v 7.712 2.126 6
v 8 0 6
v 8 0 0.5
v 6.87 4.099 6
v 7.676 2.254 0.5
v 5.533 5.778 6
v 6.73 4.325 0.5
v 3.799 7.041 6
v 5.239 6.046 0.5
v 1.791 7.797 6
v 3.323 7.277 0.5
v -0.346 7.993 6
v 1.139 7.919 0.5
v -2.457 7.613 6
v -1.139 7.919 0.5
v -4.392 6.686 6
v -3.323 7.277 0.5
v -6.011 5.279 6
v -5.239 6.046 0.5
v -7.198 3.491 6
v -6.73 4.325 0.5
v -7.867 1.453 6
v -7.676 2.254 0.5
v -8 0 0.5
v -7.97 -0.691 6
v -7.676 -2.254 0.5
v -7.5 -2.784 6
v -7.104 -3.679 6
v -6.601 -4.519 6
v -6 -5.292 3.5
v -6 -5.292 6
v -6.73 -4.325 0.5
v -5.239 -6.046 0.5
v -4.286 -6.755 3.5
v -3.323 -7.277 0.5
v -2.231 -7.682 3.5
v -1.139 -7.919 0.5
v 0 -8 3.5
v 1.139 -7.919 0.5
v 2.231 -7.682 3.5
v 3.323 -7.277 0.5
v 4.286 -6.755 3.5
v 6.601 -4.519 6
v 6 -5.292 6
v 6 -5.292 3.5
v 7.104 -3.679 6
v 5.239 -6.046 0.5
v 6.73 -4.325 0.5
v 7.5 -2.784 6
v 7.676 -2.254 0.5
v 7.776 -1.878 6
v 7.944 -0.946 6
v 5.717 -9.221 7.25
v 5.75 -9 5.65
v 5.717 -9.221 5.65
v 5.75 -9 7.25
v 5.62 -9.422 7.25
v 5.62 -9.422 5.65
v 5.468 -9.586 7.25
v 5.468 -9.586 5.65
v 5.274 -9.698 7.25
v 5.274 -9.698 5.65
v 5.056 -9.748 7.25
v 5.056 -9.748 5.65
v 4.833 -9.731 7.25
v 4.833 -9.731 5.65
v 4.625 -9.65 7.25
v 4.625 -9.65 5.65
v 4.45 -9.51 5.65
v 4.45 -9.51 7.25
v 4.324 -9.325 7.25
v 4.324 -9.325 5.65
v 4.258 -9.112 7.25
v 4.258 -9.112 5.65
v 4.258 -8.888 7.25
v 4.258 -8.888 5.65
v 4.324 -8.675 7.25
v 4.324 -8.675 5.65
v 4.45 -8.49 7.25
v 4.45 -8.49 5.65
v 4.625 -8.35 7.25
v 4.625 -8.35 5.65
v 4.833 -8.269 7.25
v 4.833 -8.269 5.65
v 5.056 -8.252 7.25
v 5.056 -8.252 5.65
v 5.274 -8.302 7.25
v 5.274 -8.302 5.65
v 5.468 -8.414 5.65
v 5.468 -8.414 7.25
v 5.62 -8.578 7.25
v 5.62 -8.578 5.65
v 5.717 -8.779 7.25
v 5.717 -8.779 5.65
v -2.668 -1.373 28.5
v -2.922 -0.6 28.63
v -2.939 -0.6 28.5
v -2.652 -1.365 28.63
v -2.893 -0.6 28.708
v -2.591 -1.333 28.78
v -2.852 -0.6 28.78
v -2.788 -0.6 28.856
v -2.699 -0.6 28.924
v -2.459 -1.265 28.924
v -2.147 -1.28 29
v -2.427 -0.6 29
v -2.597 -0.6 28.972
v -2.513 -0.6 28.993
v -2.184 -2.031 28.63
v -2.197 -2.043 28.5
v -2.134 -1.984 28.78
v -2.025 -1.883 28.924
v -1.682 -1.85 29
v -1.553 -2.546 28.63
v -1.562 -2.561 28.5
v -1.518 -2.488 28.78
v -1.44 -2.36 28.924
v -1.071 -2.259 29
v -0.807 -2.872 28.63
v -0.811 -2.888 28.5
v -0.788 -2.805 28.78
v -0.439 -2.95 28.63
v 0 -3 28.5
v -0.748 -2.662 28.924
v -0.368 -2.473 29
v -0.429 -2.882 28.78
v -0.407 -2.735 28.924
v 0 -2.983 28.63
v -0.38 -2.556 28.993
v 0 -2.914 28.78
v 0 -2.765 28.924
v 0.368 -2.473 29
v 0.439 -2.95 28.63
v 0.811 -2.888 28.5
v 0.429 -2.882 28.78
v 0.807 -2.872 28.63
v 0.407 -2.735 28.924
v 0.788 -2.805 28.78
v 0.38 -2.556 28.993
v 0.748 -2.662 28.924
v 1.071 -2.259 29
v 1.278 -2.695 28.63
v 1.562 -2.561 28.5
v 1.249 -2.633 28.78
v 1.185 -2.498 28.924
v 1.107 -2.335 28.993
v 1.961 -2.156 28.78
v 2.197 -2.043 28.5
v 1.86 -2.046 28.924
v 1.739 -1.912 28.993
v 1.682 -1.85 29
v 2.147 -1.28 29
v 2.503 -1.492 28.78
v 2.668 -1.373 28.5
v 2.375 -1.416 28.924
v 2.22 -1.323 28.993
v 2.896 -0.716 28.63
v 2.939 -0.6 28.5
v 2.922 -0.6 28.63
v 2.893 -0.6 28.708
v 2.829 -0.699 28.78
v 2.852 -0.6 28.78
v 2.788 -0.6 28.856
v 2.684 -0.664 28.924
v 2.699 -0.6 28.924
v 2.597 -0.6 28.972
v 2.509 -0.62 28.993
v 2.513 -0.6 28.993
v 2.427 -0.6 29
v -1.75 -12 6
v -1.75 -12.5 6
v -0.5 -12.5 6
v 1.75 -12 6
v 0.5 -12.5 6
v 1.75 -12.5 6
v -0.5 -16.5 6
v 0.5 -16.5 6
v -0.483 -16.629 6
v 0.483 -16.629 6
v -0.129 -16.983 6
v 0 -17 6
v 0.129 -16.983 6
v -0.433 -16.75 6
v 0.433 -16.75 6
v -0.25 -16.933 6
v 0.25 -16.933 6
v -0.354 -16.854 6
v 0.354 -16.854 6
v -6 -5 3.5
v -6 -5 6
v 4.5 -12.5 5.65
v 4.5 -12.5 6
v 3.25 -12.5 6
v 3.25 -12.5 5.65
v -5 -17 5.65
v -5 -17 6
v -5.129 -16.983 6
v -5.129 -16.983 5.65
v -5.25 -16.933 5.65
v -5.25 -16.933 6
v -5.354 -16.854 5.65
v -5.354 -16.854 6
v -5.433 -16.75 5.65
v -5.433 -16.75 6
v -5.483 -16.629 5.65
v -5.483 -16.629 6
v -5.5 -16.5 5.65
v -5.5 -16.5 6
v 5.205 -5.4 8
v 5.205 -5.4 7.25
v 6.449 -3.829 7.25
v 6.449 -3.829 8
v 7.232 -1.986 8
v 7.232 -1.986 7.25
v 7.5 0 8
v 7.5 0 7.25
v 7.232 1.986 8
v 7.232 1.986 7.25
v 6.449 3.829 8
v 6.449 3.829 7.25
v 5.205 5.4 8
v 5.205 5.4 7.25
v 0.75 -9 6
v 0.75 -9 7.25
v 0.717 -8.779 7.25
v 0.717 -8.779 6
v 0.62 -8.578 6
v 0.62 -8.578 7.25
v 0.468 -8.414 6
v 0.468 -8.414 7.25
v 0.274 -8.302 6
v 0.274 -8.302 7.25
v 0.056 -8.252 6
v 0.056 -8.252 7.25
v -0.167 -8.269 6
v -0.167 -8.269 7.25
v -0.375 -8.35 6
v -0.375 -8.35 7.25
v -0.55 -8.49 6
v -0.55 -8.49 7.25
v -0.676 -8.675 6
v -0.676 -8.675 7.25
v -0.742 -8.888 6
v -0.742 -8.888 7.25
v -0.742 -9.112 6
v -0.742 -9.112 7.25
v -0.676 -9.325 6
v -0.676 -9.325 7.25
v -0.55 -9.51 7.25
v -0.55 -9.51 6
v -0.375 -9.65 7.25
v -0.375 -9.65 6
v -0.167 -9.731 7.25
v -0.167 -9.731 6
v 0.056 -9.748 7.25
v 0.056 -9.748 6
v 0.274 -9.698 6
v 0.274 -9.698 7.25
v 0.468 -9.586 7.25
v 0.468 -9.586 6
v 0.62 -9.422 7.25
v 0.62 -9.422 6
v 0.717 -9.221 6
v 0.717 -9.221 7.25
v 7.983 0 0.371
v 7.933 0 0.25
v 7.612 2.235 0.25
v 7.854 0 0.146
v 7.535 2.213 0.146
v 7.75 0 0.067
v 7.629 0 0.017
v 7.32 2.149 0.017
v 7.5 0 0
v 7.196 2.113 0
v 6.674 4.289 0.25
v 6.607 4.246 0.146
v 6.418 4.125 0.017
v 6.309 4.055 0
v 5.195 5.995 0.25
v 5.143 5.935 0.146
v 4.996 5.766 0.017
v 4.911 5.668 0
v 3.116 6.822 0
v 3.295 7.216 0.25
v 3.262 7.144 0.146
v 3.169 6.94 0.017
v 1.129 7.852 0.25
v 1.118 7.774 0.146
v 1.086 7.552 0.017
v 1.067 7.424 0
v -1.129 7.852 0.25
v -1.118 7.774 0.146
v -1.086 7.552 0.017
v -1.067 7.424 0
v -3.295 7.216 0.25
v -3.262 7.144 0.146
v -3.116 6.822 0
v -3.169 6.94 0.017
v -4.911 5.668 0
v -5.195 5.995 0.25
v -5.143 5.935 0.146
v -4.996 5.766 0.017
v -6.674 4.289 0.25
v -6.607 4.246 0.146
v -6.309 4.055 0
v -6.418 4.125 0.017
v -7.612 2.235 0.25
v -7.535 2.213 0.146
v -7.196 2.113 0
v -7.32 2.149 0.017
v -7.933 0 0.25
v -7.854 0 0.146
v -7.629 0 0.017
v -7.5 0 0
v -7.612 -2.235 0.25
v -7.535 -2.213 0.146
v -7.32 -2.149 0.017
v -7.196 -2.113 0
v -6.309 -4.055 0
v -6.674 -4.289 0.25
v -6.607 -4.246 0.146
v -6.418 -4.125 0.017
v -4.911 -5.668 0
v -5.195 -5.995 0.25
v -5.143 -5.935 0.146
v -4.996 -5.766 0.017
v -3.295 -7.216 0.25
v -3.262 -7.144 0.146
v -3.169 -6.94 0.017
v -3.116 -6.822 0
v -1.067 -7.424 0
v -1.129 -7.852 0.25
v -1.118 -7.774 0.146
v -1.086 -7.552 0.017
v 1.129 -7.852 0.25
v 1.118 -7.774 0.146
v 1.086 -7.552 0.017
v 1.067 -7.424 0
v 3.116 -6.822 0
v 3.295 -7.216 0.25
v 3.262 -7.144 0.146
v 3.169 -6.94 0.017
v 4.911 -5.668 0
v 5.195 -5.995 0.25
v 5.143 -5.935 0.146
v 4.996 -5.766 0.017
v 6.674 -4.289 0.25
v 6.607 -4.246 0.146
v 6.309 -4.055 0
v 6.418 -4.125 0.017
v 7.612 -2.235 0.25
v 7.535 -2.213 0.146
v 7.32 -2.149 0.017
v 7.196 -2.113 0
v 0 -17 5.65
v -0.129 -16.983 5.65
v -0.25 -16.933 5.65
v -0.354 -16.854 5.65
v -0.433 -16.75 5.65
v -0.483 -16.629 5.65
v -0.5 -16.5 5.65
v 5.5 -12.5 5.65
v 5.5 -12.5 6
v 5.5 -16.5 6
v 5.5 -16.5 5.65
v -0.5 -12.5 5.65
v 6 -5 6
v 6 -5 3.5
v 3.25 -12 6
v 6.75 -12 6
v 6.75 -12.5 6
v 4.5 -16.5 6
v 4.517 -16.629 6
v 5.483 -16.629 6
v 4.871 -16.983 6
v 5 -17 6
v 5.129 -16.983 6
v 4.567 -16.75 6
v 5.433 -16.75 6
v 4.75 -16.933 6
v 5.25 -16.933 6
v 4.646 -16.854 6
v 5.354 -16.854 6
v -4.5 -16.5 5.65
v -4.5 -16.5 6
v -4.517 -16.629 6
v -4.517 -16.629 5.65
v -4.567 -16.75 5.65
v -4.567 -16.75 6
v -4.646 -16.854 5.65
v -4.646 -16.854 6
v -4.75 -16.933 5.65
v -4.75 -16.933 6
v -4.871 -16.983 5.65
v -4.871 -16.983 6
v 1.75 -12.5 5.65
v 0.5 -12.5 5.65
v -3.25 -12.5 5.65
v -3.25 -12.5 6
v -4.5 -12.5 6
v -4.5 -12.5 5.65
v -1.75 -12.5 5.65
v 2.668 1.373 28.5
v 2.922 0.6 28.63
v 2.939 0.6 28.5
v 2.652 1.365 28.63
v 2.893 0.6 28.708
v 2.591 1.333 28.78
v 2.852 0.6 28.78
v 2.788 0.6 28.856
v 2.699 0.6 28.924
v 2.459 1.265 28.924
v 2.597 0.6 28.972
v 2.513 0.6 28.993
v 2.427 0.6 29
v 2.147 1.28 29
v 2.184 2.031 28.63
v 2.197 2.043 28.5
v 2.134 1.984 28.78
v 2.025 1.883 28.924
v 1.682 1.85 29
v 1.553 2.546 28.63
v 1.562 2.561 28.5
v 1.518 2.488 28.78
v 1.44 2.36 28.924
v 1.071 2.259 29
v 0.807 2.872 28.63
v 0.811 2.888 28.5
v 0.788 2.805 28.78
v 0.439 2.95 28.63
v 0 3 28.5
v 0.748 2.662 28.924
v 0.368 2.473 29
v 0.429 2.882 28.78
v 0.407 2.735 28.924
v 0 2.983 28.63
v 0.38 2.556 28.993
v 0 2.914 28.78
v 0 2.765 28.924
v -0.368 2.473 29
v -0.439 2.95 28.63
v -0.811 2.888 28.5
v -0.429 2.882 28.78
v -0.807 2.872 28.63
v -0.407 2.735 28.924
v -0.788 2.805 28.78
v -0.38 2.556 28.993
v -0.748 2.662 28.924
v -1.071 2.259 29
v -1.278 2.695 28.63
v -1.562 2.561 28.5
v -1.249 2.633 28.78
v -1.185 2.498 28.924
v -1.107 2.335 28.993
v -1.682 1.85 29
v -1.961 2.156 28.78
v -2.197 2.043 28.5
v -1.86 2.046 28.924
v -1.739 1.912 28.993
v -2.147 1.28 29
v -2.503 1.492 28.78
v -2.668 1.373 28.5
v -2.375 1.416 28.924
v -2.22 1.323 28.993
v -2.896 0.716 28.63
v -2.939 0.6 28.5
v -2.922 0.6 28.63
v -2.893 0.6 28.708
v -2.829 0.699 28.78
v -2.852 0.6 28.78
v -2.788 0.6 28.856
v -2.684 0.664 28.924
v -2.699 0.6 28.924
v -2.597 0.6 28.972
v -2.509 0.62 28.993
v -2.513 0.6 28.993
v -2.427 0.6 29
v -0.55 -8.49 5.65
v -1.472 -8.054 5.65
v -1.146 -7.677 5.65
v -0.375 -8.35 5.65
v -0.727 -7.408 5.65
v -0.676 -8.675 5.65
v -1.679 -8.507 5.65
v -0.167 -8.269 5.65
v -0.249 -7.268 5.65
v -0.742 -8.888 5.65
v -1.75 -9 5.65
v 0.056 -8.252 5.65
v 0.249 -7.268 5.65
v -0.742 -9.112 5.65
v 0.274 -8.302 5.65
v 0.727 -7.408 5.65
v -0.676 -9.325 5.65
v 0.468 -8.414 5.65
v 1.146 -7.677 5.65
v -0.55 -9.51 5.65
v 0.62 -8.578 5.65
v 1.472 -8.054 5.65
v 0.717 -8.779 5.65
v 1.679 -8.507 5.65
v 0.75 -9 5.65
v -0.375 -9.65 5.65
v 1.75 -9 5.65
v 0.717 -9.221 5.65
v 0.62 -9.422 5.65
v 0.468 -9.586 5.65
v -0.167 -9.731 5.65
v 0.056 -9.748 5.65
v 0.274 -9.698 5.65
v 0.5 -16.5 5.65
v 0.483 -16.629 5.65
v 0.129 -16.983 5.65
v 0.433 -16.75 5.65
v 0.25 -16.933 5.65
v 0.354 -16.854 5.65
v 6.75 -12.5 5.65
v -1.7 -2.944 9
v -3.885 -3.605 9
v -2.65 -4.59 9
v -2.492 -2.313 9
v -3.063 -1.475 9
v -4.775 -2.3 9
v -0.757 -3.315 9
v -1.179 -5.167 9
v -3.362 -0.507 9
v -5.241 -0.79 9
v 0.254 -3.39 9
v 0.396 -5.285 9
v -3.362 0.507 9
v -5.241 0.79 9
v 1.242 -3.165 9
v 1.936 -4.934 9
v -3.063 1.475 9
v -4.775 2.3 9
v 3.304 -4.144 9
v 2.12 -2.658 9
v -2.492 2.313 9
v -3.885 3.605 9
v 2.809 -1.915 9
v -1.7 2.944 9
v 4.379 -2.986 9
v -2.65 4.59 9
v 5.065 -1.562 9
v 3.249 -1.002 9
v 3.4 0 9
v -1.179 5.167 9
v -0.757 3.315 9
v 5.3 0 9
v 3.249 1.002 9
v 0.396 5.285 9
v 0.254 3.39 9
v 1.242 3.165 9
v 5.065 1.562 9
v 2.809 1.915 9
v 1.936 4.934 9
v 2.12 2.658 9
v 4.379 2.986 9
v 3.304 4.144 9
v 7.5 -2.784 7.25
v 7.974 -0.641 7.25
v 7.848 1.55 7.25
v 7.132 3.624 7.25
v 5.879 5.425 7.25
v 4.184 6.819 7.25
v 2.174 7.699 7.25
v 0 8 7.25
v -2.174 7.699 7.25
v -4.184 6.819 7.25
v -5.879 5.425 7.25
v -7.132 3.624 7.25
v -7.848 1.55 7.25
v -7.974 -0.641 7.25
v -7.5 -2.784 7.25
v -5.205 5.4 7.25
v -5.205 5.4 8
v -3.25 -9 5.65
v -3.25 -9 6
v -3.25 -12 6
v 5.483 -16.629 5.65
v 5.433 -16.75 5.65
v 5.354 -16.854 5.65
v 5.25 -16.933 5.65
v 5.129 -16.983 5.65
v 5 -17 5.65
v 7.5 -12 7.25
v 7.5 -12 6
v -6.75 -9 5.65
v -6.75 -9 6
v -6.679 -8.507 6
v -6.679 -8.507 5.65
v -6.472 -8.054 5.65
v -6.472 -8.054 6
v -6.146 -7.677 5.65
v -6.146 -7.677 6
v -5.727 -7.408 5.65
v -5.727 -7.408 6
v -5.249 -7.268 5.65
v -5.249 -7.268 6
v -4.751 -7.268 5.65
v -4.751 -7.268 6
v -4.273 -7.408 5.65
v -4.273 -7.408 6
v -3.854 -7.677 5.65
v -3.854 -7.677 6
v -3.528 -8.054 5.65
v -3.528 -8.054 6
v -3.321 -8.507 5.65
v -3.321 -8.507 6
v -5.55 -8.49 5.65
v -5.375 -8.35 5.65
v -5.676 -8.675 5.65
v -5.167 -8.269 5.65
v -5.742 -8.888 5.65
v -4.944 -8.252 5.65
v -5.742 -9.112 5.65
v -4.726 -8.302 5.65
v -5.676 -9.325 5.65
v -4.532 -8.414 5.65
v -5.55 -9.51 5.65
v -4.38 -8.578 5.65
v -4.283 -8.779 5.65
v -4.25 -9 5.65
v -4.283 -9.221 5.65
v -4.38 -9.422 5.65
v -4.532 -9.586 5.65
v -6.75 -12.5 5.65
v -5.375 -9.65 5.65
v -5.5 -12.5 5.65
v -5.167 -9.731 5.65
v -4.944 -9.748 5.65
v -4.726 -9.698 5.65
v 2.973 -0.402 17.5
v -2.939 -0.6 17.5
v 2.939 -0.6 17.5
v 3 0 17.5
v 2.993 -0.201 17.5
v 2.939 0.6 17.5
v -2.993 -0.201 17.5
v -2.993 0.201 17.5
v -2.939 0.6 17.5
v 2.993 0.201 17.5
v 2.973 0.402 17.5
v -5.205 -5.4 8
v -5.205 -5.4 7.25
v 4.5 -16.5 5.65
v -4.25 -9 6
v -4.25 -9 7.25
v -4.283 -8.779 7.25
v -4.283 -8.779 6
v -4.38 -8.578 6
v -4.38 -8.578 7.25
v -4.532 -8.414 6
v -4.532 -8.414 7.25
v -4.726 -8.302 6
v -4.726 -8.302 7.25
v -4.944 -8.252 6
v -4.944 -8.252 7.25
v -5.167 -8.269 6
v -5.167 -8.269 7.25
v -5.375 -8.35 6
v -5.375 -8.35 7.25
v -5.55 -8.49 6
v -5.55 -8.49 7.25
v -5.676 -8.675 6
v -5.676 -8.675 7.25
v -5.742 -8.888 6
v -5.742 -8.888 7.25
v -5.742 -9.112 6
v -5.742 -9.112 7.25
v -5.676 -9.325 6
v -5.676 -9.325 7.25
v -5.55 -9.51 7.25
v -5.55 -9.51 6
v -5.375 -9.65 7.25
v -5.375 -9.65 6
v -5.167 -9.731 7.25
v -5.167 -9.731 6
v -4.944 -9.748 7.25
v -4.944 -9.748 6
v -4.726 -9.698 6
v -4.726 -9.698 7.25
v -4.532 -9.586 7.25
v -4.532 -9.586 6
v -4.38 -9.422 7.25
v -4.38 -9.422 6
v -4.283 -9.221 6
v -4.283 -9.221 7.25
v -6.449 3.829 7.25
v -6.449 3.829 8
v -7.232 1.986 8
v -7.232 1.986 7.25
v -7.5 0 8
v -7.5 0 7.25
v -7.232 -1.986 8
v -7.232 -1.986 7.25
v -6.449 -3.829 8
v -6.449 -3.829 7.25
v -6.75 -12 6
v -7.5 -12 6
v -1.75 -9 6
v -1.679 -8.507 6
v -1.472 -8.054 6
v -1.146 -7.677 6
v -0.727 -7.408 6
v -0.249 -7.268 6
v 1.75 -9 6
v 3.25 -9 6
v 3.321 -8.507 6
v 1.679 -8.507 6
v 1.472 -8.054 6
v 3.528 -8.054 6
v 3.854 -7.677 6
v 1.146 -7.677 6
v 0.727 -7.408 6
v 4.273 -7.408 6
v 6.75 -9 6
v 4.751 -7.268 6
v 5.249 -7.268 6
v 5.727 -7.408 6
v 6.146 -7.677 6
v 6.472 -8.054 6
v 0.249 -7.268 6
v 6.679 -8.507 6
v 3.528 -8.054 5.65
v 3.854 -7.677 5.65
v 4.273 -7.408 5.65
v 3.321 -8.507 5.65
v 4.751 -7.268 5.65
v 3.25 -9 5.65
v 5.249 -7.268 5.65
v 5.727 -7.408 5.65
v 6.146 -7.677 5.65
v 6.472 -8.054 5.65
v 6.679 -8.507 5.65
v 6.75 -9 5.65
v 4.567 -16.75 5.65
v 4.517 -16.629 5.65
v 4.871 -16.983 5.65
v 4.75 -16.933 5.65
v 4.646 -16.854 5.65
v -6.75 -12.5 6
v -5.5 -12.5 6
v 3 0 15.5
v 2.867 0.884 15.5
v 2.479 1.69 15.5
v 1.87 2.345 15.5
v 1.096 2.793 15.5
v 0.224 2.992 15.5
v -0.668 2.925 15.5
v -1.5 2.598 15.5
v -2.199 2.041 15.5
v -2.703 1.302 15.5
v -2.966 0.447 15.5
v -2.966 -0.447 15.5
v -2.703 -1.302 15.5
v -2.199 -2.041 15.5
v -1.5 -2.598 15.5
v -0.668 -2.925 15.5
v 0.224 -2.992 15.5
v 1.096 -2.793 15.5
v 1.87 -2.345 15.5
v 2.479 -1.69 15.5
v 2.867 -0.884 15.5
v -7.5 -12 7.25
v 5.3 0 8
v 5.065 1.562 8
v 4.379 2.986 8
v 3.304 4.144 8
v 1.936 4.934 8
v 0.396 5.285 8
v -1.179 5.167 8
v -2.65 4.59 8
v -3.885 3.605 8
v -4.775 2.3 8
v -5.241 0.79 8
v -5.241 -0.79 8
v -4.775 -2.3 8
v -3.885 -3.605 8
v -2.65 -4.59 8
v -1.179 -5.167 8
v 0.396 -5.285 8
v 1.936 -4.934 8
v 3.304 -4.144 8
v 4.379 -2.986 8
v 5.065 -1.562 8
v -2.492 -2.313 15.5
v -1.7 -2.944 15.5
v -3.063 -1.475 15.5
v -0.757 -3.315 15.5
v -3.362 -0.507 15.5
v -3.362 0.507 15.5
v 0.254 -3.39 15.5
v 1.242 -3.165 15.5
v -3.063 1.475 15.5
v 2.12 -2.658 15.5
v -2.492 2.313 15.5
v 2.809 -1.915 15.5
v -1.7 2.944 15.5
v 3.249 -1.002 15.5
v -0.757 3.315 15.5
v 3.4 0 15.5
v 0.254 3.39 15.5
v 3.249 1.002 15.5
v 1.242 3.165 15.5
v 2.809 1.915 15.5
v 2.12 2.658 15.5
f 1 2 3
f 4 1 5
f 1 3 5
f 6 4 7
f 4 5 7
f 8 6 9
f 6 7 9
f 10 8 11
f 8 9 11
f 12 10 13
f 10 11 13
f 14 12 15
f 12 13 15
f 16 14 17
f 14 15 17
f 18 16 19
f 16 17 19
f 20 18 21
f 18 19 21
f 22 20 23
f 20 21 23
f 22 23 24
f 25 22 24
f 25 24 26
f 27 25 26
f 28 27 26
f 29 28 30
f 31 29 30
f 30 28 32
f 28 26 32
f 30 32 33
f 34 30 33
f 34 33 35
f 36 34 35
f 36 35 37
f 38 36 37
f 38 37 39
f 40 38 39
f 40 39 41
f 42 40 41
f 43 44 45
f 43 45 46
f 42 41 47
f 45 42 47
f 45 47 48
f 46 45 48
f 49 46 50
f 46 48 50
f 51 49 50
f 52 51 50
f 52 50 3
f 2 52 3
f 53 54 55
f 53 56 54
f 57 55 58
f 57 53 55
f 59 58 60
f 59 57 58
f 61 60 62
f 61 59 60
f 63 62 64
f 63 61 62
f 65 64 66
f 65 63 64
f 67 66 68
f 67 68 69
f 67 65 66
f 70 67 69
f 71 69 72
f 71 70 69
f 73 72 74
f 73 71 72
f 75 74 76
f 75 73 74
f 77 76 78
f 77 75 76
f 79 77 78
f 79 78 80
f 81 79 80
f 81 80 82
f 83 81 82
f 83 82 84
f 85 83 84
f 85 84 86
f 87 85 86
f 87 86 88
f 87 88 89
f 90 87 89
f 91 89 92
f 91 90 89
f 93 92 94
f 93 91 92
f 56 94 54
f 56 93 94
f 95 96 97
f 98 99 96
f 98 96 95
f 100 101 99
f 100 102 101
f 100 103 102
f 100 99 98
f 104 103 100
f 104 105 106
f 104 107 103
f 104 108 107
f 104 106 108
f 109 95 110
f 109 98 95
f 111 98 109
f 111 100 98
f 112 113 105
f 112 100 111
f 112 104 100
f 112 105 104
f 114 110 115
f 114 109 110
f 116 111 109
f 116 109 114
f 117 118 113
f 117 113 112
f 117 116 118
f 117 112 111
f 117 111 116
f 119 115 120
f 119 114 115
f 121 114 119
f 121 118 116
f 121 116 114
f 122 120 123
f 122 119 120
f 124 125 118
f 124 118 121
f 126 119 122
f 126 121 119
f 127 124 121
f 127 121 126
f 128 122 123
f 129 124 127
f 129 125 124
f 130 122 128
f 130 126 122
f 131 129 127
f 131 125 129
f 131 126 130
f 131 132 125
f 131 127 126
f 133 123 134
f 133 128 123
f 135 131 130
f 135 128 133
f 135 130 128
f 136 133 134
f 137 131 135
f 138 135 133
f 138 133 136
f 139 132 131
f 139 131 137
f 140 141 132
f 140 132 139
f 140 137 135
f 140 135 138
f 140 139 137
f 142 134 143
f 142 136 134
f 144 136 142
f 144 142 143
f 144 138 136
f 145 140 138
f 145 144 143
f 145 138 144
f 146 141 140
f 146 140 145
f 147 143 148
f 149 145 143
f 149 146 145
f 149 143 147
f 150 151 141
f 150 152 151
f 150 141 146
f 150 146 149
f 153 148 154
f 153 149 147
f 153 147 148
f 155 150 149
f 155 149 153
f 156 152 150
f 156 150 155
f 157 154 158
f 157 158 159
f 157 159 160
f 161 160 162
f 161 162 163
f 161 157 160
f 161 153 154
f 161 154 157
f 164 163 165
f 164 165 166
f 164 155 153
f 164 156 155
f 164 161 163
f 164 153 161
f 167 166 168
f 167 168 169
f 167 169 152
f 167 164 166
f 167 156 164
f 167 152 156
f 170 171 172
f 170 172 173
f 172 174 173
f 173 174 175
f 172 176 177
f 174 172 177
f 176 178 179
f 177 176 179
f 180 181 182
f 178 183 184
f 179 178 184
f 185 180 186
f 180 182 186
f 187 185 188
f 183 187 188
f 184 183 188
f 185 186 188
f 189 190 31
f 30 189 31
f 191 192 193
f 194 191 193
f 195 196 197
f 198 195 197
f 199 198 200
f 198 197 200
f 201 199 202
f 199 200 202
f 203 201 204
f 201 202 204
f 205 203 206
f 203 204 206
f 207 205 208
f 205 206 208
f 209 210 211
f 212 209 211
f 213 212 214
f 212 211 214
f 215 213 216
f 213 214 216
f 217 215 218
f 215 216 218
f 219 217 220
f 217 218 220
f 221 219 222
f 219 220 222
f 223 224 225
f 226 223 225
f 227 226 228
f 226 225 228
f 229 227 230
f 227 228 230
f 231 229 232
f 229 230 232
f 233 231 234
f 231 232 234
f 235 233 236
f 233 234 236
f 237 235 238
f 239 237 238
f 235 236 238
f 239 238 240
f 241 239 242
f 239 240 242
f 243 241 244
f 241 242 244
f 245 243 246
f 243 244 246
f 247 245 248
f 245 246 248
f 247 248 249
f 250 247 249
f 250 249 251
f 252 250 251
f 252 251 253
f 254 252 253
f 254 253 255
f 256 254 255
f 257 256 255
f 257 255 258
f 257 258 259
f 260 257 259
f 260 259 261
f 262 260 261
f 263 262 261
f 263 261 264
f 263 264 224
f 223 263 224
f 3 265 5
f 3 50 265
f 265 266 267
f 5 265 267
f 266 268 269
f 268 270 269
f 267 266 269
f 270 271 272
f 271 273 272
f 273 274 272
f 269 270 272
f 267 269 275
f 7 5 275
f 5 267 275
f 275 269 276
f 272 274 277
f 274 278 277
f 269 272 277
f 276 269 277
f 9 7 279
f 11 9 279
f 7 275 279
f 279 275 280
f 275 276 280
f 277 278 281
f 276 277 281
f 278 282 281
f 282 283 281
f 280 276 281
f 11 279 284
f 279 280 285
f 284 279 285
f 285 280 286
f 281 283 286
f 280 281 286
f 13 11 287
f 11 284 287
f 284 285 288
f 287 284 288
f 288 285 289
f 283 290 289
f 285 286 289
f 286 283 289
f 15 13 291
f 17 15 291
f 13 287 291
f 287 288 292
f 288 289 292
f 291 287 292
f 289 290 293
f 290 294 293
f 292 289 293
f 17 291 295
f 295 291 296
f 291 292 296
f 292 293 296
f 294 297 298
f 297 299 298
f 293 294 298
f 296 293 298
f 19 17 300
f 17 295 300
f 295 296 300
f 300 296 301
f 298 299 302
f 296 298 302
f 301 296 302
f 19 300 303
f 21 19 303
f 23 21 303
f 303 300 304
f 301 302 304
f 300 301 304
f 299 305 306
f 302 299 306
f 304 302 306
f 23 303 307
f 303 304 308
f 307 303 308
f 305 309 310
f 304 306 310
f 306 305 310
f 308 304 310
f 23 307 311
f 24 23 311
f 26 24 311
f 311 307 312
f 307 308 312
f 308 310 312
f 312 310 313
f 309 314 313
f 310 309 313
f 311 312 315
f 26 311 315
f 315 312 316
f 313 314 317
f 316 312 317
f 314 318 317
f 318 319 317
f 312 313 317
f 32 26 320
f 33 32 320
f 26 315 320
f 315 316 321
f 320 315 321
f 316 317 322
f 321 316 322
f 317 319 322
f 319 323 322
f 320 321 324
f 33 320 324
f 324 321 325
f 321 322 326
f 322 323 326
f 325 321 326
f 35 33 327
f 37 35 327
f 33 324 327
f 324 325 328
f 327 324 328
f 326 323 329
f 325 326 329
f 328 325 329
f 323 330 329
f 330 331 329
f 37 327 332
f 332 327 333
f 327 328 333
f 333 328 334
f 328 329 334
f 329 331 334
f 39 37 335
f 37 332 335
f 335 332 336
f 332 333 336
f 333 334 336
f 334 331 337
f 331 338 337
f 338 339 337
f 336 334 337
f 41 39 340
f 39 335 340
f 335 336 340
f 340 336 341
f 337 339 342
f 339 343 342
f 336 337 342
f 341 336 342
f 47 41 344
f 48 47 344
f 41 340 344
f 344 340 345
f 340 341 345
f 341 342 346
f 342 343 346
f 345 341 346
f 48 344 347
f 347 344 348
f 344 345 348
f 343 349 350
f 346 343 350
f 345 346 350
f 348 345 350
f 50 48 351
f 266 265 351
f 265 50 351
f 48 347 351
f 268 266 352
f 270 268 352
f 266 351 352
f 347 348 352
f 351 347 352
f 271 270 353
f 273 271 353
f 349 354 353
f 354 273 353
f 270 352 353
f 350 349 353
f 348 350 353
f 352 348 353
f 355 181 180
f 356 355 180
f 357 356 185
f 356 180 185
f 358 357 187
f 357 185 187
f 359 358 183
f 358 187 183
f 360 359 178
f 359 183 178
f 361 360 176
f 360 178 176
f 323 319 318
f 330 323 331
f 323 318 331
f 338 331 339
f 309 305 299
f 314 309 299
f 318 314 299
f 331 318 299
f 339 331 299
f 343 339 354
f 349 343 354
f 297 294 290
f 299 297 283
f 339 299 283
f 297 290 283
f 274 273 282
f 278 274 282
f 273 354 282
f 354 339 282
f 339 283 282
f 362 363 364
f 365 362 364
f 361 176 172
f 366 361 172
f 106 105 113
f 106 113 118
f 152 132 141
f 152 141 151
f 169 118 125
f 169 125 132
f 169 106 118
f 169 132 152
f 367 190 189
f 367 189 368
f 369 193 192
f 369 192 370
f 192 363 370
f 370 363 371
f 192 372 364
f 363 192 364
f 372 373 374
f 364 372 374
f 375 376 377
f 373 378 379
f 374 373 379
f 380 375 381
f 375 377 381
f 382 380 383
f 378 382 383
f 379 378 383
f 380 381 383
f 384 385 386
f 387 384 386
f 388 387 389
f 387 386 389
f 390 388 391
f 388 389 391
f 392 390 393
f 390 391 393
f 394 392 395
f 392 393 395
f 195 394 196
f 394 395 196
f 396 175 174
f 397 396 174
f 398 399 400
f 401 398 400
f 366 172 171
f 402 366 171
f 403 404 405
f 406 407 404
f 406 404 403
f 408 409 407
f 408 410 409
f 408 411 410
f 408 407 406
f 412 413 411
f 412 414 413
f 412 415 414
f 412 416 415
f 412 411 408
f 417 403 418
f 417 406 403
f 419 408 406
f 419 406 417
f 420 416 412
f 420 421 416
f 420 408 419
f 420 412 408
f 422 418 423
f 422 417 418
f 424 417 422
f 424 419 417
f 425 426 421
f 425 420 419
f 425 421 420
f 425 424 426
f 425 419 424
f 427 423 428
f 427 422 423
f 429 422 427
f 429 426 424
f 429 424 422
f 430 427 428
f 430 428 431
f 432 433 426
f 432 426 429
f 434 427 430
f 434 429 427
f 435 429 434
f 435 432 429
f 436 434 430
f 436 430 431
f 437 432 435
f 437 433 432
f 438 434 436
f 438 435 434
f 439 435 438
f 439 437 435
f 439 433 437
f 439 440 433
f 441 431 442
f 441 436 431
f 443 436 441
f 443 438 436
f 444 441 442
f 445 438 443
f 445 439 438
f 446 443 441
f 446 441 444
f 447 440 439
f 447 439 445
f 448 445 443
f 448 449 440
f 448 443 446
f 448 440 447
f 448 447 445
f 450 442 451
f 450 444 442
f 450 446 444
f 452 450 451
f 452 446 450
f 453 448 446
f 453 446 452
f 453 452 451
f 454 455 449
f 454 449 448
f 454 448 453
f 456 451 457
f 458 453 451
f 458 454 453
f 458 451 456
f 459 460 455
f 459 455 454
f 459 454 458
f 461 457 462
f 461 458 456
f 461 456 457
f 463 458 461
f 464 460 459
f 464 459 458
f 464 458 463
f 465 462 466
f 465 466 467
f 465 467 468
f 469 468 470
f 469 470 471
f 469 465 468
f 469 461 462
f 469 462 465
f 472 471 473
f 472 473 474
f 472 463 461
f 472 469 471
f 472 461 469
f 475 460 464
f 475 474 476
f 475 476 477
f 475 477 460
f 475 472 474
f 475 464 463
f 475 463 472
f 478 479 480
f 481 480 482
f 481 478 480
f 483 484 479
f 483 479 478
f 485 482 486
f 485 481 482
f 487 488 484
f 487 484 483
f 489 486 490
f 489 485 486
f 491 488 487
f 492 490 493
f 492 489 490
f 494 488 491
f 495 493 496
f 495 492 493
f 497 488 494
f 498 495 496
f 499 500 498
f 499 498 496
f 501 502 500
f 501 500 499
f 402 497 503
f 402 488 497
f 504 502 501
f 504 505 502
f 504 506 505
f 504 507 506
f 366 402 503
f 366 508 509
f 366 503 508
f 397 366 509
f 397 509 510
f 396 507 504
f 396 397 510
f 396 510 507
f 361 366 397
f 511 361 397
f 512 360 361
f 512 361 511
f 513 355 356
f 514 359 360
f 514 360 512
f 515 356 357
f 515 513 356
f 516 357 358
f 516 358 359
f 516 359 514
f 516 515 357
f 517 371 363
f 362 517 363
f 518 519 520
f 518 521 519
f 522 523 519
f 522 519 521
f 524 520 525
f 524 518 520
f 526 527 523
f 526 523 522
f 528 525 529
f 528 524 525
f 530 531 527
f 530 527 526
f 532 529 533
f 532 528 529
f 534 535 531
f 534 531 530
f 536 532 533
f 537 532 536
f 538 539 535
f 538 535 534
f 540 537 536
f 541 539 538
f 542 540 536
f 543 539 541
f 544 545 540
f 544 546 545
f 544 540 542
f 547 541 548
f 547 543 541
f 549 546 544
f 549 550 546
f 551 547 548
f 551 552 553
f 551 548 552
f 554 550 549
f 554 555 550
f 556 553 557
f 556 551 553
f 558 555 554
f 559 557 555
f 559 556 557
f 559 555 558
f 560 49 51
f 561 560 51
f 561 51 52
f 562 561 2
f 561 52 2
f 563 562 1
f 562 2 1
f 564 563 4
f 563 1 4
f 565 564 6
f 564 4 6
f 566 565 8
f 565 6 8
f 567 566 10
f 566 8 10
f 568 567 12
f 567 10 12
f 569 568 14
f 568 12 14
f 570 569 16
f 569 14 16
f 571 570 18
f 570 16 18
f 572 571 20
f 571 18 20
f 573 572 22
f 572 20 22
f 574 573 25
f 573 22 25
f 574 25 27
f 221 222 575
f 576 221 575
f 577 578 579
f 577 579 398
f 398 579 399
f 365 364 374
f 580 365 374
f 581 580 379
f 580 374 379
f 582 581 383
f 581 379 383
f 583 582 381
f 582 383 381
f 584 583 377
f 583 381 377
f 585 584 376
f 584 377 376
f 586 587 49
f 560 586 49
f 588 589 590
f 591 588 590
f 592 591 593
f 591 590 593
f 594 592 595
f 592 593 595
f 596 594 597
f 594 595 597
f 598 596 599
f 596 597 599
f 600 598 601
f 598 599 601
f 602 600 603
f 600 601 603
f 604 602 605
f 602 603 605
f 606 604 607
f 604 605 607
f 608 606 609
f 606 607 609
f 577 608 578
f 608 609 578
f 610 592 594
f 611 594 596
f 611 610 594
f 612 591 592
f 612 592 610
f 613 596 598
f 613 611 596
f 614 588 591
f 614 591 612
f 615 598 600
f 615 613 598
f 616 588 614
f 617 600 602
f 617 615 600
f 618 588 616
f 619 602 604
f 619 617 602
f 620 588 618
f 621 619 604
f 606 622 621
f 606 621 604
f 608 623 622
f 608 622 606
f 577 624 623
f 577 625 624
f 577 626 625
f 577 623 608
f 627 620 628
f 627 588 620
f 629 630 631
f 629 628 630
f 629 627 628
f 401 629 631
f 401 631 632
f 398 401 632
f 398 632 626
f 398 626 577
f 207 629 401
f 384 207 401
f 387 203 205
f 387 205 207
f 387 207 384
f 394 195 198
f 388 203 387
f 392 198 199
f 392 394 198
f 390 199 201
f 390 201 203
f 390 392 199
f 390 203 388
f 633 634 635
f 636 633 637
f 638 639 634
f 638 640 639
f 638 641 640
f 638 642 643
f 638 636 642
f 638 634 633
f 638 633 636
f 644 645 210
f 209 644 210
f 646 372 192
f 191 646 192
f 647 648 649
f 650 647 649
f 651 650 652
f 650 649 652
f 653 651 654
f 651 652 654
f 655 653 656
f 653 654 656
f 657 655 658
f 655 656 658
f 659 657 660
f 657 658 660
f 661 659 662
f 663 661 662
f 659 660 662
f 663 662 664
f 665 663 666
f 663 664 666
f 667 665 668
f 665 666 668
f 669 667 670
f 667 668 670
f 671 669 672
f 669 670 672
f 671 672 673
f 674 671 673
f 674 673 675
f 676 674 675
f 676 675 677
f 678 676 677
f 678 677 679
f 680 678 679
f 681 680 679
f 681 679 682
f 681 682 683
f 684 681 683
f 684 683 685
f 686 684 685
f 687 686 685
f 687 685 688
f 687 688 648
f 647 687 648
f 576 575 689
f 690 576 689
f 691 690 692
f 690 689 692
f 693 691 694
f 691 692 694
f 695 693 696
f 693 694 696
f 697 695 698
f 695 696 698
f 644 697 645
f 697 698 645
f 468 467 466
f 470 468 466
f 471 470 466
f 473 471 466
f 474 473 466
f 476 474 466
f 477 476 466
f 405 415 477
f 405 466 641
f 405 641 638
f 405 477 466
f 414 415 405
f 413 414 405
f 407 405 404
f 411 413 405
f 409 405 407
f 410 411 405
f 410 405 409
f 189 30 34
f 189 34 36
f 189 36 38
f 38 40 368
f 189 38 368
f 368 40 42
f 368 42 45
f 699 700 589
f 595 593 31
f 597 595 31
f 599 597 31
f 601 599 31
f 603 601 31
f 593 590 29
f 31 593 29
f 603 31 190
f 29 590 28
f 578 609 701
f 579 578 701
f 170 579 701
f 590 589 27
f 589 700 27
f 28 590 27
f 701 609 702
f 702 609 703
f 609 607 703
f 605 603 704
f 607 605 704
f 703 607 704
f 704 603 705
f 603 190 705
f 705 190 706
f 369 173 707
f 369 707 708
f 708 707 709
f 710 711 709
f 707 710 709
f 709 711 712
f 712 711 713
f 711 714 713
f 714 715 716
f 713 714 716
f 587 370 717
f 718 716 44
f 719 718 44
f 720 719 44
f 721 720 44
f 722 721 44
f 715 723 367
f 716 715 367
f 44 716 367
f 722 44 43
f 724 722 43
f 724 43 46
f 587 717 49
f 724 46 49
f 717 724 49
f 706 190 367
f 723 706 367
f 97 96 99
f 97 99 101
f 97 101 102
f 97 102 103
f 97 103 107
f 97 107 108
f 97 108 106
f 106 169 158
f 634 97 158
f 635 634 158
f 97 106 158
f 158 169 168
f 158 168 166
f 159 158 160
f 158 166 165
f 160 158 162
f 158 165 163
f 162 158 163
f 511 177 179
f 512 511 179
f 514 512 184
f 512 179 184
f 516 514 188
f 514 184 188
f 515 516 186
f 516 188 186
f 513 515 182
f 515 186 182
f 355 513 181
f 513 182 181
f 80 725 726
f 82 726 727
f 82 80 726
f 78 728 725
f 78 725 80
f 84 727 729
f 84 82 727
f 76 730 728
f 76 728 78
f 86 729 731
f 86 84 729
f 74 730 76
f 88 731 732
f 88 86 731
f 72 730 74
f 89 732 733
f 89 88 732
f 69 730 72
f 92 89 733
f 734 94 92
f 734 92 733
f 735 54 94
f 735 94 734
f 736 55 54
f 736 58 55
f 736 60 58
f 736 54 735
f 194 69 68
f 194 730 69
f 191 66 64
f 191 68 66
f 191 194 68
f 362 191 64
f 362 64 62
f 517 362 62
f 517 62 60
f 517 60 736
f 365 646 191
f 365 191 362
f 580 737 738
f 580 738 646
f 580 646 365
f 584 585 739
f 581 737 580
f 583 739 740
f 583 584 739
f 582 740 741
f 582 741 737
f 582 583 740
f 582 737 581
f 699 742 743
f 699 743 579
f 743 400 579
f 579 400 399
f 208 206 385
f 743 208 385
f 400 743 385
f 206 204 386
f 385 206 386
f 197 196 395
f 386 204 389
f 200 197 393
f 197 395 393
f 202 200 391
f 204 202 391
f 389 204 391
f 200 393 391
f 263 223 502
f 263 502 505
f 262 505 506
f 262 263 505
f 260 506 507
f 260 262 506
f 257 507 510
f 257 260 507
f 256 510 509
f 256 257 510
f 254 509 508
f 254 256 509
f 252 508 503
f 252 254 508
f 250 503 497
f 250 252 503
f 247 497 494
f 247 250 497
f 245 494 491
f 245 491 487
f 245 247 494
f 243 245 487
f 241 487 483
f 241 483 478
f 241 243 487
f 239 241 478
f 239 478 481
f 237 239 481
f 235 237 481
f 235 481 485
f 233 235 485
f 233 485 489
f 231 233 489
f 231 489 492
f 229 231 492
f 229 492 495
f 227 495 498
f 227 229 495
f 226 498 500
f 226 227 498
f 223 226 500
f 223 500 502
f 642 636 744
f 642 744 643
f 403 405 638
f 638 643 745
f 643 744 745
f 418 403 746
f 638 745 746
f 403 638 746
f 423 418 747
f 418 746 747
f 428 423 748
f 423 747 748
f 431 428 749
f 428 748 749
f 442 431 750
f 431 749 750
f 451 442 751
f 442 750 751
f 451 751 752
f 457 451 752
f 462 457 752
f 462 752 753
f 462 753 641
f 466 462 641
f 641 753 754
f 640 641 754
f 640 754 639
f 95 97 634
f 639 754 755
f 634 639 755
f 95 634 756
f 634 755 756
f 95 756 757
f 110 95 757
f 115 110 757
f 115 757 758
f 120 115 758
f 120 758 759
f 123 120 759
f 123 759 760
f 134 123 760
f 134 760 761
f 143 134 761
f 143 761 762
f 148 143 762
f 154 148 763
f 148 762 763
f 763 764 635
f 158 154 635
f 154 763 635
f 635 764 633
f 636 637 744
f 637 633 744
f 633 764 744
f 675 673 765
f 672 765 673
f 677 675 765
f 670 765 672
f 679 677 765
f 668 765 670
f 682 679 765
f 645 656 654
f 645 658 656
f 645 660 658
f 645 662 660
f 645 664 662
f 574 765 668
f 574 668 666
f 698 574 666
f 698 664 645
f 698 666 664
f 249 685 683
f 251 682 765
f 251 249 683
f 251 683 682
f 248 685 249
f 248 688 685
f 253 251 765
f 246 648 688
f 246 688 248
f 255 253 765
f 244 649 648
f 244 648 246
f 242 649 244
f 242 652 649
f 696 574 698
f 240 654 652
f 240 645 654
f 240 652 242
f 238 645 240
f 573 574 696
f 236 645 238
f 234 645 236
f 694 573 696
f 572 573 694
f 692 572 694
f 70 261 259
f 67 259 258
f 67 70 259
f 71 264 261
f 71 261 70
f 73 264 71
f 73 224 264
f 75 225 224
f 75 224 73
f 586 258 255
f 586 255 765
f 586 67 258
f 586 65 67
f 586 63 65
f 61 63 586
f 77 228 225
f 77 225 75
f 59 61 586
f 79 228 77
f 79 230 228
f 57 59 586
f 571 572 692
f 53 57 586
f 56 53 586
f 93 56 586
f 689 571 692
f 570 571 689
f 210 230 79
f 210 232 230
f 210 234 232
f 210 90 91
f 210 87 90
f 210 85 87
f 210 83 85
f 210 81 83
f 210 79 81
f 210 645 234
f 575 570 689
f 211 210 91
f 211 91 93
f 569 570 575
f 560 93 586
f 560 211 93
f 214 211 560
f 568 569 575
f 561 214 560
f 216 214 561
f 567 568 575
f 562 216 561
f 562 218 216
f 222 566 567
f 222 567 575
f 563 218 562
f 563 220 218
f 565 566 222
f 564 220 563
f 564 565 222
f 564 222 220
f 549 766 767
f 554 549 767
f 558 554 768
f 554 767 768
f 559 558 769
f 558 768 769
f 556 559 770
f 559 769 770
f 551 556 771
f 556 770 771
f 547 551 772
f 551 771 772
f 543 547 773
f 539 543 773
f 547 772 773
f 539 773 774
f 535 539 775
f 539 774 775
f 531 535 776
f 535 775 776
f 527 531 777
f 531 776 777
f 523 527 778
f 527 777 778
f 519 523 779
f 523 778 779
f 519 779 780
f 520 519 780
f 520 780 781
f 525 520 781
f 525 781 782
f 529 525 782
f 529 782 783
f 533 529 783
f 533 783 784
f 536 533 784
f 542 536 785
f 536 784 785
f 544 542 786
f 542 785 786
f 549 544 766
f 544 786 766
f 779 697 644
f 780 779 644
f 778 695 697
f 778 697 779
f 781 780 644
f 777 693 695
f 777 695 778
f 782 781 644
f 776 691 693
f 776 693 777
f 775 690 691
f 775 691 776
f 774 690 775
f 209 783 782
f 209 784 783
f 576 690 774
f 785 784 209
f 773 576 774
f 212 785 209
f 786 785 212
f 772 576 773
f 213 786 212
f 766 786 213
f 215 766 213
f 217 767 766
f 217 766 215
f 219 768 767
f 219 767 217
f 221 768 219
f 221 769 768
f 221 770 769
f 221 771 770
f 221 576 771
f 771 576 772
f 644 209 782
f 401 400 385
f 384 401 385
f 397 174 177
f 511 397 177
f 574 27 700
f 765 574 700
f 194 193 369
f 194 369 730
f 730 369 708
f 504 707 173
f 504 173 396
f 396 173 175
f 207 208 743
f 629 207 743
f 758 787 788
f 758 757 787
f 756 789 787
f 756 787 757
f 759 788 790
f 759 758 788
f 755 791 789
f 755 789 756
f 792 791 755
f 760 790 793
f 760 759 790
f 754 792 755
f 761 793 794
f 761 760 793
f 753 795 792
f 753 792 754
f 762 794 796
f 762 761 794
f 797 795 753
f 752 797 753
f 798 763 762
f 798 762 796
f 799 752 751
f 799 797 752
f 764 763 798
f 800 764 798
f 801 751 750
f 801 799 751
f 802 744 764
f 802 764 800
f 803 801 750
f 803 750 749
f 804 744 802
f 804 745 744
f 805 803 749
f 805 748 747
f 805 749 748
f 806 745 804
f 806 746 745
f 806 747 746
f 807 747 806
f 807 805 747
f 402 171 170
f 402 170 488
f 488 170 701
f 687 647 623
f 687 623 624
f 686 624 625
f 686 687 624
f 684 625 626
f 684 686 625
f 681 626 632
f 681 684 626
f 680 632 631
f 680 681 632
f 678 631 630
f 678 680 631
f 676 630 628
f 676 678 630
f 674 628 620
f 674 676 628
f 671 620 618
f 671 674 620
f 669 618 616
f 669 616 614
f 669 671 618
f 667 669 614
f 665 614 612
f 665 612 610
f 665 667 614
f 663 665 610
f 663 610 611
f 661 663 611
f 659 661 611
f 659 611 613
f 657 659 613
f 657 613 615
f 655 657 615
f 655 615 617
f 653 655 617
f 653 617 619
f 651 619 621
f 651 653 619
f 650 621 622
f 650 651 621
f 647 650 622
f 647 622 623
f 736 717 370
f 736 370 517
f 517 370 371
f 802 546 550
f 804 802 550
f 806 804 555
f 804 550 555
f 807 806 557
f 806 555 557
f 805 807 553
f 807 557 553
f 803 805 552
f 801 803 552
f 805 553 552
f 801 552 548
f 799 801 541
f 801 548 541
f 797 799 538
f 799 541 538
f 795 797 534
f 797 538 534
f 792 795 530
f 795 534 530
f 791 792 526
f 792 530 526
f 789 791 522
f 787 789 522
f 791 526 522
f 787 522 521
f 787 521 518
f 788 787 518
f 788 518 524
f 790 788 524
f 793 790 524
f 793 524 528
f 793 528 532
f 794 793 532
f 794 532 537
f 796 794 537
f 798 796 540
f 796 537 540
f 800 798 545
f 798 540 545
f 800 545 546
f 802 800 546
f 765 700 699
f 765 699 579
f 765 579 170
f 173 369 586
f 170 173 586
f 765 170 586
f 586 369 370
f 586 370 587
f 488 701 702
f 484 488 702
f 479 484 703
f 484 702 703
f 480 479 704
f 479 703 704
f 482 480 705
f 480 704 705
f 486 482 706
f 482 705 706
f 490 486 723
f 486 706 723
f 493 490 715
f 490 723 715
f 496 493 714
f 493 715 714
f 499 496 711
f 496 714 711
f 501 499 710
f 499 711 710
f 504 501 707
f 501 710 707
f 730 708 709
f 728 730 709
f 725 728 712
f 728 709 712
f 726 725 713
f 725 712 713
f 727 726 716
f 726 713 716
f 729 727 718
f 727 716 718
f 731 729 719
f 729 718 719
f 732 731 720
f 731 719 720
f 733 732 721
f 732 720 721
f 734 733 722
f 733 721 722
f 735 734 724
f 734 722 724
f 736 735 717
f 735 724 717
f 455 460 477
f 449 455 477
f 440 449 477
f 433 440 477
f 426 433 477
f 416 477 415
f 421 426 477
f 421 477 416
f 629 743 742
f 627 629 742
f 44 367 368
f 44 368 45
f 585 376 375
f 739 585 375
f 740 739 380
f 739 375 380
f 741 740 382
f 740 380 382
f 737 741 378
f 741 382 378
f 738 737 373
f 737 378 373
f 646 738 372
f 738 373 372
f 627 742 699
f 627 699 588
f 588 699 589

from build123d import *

# Parameters (mm, degrees)
F0_R      = 8
F1_DEPTH  = 6
F3_DEPTH  = 1.25
F5_DEPTH  = 0.75
F6_R      = 5.3
F7_DEPTH  = 1
F8_R      = 3.4
F9_DEPTH  = 6.5
F10_R     = 3
F11_DEPTH = 13.5
F12_W     = 12
F12_H     = 6
F13_DEPTH = 2.5
F14_R     = 0.75
F15_DEPTH = 25
F16_R     = 0.75
F17_DEPTH = 0.35
F18_R     = 0.5
F19_W     = 11.885716
F19_H     = 1.2
F20_DEPTH = 11.5


with BuildPart() as f1:
    # F0 (on Top) → F1 (new body)
    with BuildSketch(Plane.XY):
        Circle(F0_R)
    extrude(amount=F1_DEPTH)

    # F2 (on face) → F3 (join)
    with BuildSketch(Plane.XY.offset(6)):
        with BuildLine():
            Line((-7.5, -12), (7.5, -12))
            Line((7.5, -12), (7.5, -2.783882))
            ThreePointArc((7.5, -2.783882), (0, 8), (-7.5, -2.783882))
            Line((-7.5, -2.783882), (-7.5, -12))
        make_face()
    extrude(amount=F3_DEPTH)

    # F4 (on face) → F5 (join)
    with BuildSketch(Plane.XY.offset(7.25)):
        with BuildLine():
            Line((5.204805, 5.4), (-5.204805, 5.4))
            ThreePointArc((-5.204805, 5.4), (-7.5, 0), (-5.204805, -5.4))
            Line((-5.204805, -5.4), (5.204805, -5.4))
            ThreePointArc((5.204805, -5.4), (7.5, 0), (5.204805, 5.4))
        make_face()
    extrude(amount=F5_DEPTH)

    # F6 (on face) → F7 (join)
    with BuildSketch(Plane.XY.offset(8)):
        Circle(F6_R)
    extrude(amount=F7_DEPTH)

    # F8 (on face) → F9 (join)
    with BuildSketch(Plane.XY.offset(9)):
        Circle(F8_R)
    extrude(amount=F9_DEPTH)

    # F10 (on face) → F11 (join)
    with BuildSketch(Plane.XY.offset(15.5)):
        Circle(F10_R)
    extrude(amount=F11_DEPTH)

    # F12 (on face) → F13 (cut)
    with BuildSketch(Plane(origin=(0, 0, 6), x_dir=(1, 0, 0), z_dir=(0, 0, -1))):
        with Locations((0, 8)):
            Rectangle(F12_W, F12_H)
    extrude(amount=F13_DEPTH, mode=Mode.SUBTRACT)

    # F14 (on face) → F15 (cut)
    with BuildSketch(Plane.XY.offset(7.25)):
        with Locations((-5, -9)):
            Circle(F14_R)
        with Locations((0, -9)):
            Circle(F14_R)
        with Locations((5, -9)):
            Circle(F14_R)
    extrude(amount=-F15_DEPTH, mode=Mode.SUBTRACT)

    # F16 (on face) → F17 (join)
    with BuildSketch(Plane(origin=(0, 0, 6), x_dir=(1, 0, 0), z_dir=(0, 0, -1))):
        with BuildLine():
            Line((4.5, 12.5), (3.25, 12.5))
            Line((3.25, 12.5), (3.25, 9))
            ThreePointArc((3.25, 9), (5, 7.25), (6.75, 9))
            Line((6.75, 9), (6.75, 12.5))
            Line((6.75, 12.5), (5.5, 12.5))
            Line((5.5, 12.5), (5.5, 16.5))
            ThreePointArc((5.5, 16.5), (5.353553, 16.853553), (5, 17))
            ThreePointArc((5, 17), (4.646447, 16.853553), (4.5, 16.5))
            Line((4.5, 16.5), (4.5, 12.5))
        make_face()
        with Locations((5, 9)):
            Circle(F16_R, mode=Mode.SUBTRACT)
        with BuildLine():
            Line((-0.5, 16.5), (-0.5, 12.5))
            Line((-0.5, 12.5), (-1.75, 12.5))
            Line((-1.75, 12.5), (-1.75, 9))
            ThreePointArc((-1.75, 9), (0, 7.25), (1.75, 9))
            Line((1.75, 9), (1.75, 12.5))
            Line((1.75, 12.5), (0.5, 12.5))
            Line((0.5, 12.5), (0.5, 16.5))
            ThreePointArc((0.5, 16.5), (0.353553, 16.853553), (0, 17))
            ThreePointArc((0, 17), (-0.353553, 16.853553), (-0.5, 16.5))
        make_face()
        with Locations((0, 9)):
            Circle(F16_R, mode=Mode.SUBTRACT)
        with BuildLine():
            Line((-5.5, 16.5), (-5.5, 12.5))
            Line((-5.5, 12.5), (-6.75, 12.5))
            Line((-6.75, 12.5), (-6.75, 9))
            ThreePointArc((-6.75, 9), (-5, 7.25), (-3.25, 9))
            Line((-3.25, 9), (-3.25, 12.5))
            Line((-3.25, 12.5), (-4.5, 12.5))
            Line((-4.5, 12.5), (-4.5, 16.5))
            ThreePointArc((-4.5, 16.5), (-4.646447, 16.853553), (-5, 17))
            ThreePointArc((-5, 17), (-5.353553, 16.853553), (-5.5, 16.5))
        make_face()
        with Locations((-5, 9)):
            Circle(F16_R, mode=Mode.SUBTRACT)
    extrude(amount=F17_DEPTH)

    # F18
    f18_edges = [f1.edges().sort_by_distance(p)[0] for p in [
        (-3, 0, 29),
        (-8, 0, 0),
    ]]
    fillet(f18_edges, radius=F18_R)

    # F19 (on face) → F20 (cut)
    with BuildSketch(Plane.XY.offset(29)):
        Rectangle(F19_W, F19_H)
    extrude(amount=-F20_DEPTH, mode=Mode.SUBTRACT)


solid = f1.part
